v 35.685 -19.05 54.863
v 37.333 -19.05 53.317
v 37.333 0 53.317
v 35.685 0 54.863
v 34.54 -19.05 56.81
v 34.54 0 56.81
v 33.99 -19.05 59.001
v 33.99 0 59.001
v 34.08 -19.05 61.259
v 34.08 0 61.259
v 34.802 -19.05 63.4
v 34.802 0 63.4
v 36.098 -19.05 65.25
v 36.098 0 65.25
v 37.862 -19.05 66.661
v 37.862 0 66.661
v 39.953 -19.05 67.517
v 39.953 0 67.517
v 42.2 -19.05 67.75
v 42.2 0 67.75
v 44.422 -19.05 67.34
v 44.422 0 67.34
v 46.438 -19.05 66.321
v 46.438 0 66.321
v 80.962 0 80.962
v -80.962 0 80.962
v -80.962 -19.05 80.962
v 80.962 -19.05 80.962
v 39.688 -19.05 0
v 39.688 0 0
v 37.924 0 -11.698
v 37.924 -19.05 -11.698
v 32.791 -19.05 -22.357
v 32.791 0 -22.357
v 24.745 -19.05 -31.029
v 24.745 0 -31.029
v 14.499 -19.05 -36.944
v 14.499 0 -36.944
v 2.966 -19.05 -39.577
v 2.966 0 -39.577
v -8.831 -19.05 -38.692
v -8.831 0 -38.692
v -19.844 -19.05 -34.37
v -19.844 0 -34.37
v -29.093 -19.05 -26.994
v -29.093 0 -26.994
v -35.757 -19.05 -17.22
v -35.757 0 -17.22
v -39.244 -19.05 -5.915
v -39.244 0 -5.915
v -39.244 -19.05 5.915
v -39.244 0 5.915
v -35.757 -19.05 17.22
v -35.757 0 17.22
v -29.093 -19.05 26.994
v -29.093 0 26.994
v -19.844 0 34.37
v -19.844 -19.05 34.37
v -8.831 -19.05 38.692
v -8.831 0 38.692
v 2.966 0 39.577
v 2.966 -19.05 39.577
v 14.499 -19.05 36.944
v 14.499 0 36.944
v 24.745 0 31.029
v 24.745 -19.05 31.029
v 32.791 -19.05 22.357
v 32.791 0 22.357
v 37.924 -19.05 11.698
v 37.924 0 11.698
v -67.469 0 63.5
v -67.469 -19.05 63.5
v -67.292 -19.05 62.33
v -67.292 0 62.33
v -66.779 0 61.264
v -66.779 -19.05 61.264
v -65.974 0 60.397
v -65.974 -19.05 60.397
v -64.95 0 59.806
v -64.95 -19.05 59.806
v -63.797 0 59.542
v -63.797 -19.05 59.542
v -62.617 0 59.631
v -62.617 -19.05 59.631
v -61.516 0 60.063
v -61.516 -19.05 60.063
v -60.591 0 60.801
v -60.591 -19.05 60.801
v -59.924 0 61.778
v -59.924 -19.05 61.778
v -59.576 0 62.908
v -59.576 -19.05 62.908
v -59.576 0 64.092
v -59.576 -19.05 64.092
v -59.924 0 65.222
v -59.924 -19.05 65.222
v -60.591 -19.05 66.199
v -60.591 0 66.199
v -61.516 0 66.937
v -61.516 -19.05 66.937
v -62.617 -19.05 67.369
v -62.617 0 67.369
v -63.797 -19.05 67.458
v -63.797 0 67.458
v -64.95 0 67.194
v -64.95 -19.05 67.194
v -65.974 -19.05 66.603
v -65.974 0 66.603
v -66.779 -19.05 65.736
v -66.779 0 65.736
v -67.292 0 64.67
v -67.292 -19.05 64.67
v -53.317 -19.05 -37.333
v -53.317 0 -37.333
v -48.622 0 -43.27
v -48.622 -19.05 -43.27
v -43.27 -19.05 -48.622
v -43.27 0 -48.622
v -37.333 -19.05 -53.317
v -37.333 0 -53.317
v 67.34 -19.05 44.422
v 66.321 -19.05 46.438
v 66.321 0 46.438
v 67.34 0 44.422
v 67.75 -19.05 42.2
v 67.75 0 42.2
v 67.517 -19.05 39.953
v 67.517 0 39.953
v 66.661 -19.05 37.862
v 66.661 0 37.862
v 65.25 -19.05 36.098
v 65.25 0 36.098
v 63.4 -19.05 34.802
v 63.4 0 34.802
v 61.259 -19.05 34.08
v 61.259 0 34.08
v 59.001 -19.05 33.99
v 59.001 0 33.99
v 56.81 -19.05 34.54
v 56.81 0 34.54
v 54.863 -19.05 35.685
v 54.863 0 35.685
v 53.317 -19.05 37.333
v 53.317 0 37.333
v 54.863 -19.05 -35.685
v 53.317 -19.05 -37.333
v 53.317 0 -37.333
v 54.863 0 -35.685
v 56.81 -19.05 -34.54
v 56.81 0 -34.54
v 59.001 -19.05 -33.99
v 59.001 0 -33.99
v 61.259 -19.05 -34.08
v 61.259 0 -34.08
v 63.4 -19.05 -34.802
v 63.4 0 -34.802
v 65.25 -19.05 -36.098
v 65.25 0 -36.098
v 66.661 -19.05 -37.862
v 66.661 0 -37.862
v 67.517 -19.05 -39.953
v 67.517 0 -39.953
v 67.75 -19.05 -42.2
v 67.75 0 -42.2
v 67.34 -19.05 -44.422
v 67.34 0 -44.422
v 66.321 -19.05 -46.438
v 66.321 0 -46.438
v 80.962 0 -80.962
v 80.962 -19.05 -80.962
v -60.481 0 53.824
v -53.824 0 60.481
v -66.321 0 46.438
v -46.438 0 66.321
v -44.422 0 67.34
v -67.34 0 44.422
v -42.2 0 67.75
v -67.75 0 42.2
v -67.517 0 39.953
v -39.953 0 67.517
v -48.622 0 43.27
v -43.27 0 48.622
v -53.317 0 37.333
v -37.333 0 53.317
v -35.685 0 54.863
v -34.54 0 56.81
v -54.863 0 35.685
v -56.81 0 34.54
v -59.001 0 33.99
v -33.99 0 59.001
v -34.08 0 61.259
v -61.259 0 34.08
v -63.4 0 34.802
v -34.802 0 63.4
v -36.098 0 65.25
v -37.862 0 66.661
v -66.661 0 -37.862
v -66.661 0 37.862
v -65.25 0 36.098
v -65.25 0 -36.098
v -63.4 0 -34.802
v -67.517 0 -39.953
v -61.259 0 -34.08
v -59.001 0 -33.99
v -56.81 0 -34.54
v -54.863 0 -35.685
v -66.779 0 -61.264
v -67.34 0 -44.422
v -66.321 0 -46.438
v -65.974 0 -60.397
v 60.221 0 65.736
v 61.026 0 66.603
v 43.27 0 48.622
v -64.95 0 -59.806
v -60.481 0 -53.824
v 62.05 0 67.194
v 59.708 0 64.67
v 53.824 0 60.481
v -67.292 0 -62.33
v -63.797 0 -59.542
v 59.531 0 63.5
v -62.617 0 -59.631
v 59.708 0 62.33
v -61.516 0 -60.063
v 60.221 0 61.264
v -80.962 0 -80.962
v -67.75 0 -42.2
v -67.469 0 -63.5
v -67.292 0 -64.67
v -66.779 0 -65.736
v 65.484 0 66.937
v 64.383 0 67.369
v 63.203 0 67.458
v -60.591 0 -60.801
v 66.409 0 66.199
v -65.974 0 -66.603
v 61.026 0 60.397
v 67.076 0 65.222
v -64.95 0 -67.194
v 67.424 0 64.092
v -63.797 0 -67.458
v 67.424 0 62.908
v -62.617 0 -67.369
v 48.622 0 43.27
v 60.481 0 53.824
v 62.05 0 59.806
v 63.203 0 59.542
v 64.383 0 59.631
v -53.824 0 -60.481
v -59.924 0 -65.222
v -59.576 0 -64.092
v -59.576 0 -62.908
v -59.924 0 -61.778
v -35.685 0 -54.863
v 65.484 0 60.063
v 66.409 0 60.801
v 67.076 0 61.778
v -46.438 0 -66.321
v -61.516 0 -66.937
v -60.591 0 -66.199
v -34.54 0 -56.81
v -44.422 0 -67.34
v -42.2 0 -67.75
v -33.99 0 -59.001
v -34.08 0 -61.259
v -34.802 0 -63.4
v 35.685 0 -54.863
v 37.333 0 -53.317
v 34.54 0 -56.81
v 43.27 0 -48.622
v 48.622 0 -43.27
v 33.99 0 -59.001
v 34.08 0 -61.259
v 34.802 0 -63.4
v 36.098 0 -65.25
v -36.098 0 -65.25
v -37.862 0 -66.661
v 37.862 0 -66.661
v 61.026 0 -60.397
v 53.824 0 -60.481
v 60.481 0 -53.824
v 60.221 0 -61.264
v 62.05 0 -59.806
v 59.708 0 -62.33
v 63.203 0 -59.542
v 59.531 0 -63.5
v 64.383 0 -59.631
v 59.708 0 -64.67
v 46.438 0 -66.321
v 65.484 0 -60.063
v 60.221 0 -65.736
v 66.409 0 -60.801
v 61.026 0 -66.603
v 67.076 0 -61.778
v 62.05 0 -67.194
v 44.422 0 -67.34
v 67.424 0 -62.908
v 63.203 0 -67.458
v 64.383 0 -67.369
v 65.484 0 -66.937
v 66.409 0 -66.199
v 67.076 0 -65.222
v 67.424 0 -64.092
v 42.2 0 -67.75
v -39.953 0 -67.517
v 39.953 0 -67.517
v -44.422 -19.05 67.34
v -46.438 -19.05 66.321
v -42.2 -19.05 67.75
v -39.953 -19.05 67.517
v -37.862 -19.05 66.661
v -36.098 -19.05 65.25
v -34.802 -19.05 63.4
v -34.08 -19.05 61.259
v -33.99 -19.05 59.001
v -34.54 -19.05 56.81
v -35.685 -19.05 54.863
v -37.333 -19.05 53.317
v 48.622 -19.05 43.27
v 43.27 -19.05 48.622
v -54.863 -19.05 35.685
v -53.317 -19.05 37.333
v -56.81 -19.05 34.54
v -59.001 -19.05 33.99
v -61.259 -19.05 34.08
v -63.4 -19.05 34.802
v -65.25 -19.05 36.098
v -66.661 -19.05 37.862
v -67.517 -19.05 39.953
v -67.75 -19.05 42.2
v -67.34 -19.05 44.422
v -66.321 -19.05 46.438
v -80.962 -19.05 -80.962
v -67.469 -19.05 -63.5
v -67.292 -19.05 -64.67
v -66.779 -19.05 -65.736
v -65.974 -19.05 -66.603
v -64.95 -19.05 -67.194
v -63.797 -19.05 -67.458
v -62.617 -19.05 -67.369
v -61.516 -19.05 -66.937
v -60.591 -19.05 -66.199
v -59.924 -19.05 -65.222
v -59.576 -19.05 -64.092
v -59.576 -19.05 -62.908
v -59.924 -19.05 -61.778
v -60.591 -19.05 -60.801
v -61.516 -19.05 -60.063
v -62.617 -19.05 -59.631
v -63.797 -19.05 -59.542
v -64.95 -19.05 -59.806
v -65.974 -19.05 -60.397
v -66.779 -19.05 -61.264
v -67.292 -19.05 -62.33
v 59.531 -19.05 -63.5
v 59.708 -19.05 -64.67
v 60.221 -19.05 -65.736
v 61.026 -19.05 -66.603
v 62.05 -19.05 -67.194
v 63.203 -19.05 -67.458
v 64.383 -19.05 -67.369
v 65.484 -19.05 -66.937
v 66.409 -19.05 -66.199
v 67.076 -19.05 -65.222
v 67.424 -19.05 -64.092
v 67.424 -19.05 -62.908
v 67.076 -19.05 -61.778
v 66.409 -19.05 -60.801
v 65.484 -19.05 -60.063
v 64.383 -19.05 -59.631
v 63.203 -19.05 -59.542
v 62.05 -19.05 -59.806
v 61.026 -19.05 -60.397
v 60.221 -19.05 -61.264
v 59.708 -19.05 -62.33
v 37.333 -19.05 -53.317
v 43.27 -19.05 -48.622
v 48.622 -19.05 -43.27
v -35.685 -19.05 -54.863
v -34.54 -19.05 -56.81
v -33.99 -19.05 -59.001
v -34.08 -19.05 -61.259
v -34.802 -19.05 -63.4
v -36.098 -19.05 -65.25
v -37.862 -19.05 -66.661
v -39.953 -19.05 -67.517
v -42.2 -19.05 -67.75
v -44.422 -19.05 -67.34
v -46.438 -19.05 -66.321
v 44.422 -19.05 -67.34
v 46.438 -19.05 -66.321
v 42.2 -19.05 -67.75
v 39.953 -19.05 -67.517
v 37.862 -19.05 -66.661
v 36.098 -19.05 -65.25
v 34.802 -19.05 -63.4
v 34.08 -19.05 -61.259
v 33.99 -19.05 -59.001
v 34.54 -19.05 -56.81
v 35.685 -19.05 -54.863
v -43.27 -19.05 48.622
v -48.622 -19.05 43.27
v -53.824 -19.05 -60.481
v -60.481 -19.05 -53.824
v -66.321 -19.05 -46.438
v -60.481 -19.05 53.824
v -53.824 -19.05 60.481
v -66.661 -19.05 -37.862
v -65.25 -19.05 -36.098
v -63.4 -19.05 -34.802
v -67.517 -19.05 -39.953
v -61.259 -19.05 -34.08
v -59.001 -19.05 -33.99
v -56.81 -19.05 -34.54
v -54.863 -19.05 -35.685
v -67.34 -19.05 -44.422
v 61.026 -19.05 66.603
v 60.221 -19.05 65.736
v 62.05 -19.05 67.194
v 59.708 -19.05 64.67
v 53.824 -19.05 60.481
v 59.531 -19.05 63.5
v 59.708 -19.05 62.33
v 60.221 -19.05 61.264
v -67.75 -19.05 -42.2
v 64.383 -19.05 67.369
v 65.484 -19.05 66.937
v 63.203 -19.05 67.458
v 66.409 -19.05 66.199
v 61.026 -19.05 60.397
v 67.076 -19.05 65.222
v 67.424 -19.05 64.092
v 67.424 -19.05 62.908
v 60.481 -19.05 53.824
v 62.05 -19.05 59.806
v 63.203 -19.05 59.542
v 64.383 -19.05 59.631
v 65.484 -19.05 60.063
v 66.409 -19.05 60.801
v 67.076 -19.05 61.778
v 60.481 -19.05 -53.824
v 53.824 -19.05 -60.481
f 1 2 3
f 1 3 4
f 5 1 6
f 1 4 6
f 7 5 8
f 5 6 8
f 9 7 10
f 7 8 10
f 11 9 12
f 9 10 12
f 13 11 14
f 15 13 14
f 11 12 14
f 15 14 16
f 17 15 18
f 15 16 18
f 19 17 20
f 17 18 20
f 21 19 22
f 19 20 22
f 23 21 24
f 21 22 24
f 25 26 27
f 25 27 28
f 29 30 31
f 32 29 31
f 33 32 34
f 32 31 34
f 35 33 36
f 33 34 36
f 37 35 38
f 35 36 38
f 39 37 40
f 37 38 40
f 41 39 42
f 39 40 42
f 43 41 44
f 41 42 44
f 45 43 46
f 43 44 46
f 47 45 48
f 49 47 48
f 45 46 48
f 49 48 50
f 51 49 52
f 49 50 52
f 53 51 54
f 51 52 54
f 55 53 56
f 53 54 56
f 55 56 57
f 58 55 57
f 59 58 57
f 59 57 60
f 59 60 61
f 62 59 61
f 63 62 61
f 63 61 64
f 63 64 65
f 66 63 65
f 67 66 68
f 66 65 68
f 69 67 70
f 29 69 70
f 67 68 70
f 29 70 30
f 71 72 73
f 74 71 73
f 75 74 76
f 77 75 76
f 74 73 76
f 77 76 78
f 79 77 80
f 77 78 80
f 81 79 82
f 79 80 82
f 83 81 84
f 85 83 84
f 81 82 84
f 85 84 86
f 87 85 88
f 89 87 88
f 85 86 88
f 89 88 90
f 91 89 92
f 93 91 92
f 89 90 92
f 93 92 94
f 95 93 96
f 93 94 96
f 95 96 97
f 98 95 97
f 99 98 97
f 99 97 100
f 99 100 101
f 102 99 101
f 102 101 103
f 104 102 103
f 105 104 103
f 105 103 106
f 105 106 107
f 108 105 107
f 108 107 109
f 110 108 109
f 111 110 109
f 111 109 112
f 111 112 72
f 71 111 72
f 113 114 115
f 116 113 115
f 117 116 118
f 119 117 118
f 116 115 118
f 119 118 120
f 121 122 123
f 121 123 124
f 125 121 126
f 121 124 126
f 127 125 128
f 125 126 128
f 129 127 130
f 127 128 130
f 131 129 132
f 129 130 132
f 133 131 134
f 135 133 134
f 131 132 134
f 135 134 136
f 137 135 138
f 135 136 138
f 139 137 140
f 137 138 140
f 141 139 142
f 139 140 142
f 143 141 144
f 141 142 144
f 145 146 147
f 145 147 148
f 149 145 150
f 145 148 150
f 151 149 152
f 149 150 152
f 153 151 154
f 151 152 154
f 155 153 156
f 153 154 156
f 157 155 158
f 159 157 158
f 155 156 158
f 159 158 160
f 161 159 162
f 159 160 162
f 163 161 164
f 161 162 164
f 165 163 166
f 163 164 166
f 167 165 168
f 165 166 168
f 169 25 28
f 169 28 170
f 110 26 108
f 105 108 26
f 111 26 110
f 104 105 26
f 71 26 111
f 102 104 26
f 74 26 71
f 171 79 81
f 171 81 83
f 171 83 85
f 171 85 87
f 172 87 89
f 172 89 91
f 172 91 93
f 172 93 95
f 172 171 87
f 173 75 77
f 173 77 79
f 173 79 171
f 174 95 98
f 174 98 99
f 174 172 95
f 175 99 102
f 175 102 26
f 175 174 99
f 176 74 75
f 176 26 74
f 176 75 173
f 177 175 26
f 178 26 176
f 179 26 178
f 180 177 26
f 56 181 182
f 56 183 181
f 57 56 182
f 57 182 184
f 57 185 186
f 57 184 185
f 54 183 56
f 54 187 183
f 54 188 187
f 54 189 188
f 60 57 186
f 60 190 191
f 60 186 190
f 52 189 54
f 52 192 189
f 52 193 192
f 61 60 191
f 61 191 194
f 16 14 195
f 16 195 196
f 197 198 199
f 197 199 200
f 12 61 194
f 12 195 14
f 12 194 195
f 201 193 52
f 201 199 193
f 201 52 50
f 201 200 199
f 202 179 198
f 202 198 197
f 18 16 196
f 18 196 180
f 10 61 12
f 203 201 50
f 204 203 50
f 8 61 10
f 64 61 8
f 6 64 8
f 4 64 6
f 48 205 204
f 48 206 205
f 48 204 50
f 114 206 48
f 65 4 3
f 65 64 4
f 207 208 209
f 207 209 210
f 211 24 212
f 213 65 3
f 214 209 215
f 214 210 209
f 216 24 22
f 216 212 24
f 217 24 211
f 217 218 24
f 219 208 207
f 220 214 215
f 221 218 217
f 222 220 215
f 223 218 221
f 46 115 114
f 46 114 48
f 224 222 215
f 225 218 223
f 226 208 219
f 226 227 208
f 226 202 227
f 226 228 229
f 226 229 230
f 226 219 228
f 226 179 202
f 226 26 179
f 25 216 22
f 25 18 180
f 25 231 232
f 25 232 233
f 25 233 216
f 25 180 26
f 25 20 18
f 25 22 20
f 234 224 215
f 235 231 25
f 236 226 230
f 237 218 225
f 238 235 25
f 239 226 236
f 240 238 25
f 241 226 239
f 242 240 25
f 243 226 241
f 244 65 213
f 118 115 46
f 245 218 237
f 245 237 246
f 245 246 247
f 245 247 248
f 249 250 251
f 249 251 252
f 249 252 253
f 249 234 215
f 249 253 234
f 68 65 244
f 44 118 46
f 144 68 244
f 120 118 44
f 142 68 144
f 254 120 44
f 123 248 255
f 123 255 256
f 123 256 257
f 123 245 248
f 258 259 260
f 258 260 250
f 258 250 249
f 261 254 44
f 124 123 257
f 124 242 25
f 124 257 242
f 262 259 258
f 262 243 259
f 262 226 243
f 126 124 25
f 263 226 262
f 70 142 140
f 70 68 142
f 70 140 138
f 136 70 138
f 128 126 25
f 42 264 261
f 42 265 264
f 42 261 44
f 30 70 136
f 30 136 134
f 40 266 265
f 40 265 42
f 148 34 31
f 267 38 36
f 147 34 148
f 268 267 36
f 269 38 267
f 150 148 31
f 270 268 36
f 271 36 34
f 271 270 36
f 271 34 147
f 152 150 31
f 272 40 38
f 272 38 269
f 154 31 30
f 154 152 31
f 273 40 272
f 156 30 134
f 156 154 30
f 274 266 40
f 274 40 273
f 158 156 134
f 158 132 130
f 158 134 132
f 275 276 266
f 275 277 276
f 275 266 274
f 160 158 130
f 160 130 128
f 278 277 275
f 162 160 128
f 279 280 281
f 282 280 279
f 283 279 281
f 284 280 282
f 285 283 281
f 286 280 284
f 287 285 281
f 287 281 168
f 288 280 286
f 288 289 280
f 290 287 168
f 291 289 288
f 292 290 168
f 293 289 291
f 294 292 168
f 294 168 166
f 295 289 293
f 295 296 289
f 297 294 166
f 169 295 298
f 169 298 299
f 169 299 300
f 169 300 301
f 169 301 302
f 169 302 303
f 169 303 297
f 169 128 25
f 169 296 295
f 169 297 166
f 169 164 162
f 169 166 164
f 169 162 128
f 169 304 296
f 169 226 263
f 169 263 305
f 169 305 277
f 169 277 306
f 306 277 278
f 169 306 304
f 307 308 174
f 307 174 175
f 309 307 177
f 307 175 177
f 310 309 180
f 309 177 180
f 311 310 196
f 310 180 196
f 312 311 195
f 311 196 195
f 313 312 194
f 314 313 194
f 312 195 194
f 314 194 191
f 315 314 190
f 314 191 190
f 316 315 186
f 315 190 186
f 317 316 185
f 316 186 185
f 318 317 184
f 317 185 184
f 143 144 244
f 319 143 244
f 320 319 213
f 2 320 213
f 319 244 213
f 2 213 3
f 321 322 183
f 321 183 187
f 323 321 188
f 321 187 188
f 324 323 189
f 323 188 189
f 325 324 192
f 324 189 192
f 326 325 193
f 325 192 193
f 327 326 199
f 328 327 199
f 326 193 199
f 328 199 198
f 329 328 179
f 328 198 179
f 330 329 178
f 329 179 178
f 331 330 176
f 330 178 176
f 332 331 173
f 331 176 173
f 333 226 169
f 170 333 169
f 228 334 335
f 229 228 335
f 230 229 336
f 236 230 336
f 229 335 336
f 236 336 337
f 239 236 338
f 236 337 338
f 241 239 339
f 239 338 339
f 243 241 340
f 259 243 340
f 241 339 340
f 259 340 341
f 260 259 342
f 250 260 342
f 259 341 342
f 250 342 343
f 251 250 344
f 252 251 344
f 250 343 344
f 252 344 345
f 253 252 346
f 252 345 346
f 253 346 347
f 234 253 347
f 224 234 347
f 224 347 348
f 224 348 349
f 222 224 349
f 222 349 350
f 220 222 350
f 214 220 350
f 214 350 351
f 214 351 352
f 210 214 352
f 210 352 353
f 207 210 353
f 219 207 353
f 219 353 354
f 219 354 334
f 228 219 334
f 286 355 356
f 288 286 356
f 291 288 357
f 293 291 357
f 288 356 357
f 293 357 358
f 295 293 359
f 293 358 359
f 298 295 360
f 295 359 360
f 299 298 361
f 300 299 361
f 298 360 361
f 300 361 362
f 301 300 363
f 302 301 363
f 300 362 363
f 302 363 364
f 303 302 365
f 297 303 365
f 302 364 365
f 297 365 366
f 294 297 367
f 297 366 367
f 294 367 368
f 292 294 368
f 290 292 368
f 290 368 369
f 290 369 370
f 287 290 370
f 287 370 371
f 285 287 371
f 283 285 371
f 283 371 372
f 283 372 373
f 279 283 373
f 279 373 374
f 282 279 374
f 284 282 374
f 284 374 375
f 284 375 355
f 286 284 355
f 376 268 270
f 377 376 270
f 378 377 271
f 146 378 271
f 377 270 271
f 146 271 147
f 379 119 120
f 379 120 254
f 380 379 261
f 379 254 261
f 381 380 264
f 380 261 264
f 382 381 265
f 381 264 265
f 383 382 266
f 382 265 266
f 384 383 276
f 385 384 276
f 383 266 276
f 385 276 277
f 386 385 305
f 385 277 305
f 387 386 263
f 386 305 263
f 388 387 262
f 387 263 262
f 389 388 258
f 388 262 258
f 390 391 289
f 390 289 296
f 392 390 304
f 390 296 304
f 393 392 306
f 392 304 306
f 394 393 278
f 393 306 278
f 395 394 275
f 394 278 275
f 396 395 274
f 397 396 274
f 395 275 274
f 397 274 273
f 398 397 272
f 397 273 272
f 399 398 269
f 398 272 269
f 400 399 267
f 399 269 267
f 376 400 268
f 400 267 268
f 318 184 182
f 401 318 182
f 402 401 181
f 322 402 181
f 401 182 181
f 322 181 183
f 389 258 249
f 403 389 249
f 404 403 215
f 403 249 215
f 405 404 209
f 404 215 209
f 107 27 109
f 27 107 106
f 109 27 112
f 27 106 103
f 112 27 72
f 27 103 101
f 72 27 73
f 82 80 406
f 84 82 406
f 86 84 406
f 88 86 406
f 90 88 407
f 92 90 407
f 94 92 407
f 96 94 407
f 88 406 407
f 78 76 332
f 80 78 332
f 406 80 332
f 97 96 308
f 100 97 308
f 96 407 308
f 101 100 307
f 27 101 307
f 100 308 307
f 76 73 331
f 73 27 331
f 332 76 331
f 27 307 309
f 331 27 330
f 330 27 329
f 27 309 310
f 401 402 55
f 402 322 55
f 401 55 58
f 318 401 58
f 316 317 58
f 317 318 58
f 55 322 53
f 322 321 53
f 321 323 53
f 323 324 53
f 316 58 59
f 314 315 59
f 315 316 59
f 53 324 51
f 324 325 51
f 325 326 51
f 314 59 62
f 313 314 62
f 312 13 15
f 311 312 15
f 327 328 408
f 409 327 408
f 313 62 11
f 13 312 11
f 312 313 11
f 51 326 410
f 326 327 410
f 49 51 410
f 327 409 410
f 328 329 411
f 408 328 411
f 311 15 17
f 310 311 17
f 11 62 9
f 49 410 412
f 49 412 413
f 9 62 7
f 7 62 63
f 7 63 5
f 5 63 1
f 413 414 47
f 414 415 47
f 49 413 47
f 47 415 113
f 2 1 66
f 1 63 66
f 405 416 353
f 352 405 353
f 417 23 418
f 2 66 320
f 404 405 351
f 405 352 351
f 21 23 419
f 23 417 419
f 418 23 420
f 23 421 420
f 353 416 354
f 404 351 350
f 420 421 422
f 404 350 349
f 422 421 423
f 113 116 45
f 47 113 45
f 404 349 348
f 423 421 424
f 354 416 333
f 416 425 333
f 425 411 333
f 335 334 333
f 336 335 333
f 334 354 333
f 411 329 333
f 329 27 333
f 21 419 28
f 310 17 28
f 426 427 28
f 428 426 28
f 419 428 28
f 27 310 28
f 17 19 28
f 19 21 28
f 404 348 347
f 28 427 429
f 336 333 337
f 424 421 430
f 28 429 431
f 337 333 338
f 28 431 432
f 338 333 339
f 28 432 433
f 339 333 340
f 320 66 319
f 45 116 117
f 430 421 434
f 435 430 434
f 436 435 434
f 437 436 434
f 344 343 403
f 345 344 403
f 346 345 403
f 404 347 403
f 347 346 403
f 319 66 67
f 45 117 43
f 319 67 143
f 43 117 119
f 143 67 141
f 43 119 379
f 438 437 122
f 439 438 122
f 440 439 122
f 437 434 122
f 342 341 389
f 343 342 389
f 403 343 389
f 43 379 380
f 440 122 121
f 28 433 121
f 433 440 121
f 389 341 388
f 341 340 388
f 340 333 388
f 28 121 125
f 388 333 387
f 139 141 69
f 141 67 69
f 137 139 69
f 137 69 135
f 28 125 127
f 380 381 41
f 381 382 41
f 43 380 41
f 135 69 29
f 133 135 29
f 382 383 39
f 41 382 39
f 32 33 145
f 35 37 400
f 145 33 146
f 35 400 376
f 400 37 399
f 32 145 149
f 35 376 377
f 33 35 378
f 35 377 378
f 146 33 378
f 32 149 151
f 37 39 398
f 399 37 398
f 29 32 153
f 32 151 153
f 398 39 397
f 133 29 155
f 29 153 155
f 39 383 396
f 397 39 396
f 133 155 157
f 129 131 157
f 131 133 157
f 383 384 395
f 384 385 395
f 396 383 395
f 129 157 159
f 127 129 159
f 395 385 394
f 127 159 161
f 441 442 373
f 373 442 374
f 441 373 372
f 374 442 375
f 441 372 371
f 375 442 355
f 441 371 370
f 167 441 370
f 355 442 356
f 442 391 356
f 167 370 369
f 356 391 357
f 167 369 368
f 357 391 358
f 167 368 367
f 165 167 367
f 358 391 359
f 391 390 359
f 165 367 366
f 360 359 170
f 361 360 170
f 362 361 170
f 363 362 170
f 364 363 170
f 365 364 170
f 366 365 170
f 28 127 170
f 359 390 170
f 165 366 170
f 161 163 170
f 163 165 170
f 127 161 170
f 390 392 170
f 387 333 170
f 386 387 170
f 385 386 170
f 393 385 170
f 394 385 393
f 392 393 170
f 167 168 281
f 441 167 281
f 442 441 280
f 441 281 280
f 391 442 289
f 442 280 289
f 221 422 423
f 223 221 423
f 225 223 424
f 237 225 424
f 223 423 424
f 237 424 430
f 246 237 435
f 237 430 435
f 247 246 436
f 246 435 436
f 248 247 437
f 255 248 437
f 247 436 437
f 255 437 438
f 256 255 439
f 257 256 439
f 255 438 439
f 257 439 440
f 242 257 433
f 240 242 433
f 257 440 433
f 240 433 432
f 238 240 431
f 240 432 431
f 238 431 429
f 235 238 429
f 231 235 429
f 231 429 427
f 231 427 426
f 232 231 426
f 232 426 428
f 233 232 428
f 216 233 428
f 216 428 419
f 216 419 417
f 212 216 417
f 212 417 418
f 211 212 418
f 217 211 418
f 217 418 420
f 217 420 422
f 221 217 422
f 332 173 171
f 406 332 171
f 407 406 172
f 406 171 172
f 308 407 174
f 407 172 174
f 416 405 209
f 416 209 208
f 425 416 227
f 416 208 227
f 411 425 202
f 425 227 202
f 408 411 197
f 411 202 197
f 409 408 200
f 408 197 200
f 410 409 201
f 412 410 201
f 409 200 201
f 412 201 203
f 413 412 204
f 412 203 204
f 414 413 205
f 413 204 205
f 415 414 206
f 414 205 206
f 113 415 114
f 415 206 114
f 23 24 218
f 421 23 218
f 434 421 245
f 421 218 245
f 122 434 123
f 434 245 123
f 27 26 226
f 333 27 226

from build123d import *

# Parameters (mm, degrees)
ESQUISSE1_W           = 161.925
ESQUISSE1_H           = 161.925
ESQUISSE1_R           = 39.6875
BOSS_EXTRU_1_DEPTH    = 19.05
TROU_TARAUD_3_8_161_D = 7.9375


with BuildPart() as part:
    # Esquisse1 → Boss.-Extru.1 (new body)
    with BuildSketch(Plane(origin=(0, 0, 0), x_dir=(1, 0, 0), z_dir=(0, 1, 0))):
        Rectangle(ESQUISSE1_W, ESQUISSE1_H)
        Circle(ESQUISSE1_R, mode=Mode.SUBTRACT)
        with BuildLine():
            ThreePointArc((-46.438182228, 66.320597386), (-57.249132772, 57.249132772), (-66.320597386, 46.438182228))
            ThreePointArc((-66.320597386, 46.438182228), (-64.371340998, 35.383399913), (-53.316558683, 37.332656301))
            ThreePointArc((-53.316558683, 37.332656301), (-46.02381262, 46.02381262), (-37.332656301, 53.316558683))
            ThreePointArc((-37.332656301, 53.316558683), (-35.383399913, 64.371340998), (-46.438182228, 66.320597386))
        make_face(mode=Mode.SUBTRACT)
        with BuildLine():
            ThreePointArc((66.320597386, 46.438182228), (57.249132772, 57.249132772), (46.438182228, 66.320597386))
            ThreePointArc((46.438182228, 66.320597386), (35.383399913, 64.371340998), (37.332656301, 53.316558683))
            ThreePointArc((37.332656301, 53.316558683), (46.02381262, 46.02381262), (53.316558683, 37.332656301))
            ThreePointArc((53.316558683, 37.332656301), (64.371340998, 35.383399913), (66.320597386, 46.438182228))
        make_face(mode=Mode.SUBTRACT)
        with BuildLine():
            ThreePointArc((46.438182228, -66.320597386), (57.249132772, -57.249132772), (66.320597386, -46.438182228))
            ThreePointArc((66.320597386, -46.438182228), (64.371340998, -35.383399913), (53.316558683, -37.332656301))
            ThreePointArc((53.316558683, -37.332656301), (46.02381262, -46.02381262), (37.332656301, -53.316558683))
            ThreePointArc((37.332656301, -53.316558683), (35.383399913, -64.371340998), (46.438182228, -66.320597386))
        make_face(mode=Mode.SUBTRACT)
        with BuildLine():
            ThreePointArc((-66.320597386, -46.438182228), (-57.249132772, -57.249132772), (-46.438182228, -66.320597386))
            ThreePointArc((-46.438182228, -66.320597386), (-35.383399913, -64.371340998), (-37.332656301, -53.316558683))
            ThreePointArc((-37.332656301, -53.316558683), (-46.02381262, -46.02381262), (-53.316558683, -37.332656301))
            ThreePointArc((-53.316558683, -37.332656301), (-64.371340998, -35.383399913), (-66.320597386, -46.438182228))
        make_face(mode=Mode.SUBTRACT)
    extrude(amount=-BOSS_EXTRU_1_DEPTH)

    # Trou taraudé 3/8-161 (through all)
    with Locations(Plane(origin=(0, 0, 0), x_dir=(1, 0, 0), z_dir=(0, 1, 0))):
        with Locations((-63.5, 63.5), (63.5, 63.5), (-63.5, -63.5), (63.5, -63.5)):
            Hole(TROU_TARAUD_3_8_161_D / 2)


solid = part.part
